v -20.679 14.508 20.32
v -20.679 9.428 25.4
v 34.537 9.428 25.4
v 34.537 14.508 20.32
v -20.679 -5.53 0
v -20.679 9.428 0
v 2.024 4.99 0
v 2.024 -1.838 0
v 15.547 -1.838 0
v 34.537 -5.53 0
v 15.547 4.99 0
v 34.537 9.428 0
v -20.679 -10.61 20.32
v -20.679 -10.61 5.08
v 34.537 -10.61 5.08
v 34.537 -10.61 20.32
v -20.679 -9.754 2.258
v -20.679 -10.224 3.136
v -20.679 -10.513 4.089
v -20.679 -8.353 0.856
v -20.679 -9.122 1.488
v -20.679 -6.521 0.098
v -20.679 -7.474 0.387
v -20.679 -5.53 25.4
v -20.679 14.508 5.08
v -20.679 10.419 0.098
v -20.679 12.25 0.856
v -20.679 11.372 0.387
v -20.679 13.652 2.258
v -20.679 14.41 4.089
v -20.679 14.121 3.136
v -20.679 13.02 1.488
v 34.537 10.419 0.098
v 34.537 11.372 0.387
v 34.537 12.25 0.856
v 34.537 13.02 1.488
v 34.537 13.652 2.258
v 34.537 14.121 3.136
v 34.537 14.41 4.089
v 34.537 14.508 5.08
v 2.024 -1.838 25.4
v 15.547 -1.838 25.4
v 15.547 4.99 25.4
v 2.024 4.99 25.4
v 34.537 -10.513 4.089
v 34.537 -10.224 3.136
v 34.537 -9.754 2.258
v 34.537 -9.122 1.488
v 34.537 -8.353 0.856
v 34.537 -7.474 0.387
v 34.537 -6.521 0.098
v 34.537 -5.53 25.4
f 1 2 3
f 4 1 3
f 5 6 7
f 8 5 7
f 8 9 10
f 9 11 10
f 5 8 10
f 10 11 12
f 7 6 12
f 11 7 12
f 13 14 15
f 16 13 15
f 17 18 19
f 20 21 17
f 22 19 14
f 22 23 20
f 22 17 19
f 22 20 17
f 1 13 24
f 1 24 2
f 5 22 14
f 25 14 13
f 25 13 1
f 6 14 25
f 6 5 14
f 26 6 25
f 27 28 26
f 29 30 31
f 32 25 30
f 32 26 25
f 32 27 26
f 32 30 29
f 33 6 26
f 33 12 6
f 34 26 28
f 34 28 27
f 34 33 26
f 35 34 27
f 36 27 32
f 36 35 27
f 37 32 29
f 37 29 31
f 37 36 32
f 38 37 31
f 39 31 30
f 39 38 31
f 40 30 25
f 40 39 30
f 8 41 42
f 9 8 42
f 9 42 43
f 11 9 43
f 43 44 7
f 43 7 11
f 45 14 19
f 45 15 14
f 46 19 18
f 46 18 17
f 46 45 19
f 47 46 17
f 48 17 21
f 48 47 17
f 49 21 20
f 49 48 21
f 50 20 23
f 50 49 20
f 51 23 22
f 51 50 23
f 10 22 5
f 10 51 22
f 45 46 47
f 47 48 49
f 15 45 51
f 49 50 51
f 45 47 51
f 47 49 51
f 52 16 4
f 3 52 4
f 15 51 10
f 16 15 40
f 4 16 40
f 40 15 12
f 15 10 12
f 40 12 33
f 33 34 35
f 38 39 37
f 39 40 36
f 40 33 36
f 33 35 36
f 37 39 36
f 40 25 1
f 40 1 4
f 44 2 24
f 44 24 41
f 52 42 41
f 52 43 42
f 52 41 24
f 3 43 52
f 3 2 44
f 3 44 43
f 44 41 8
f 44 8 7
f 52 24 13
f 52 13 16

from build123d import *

# Parameters (mm, degrees)
F0_W     = 55.216648
F0_H     = 25.118159
F1_DEPTH = 25.4
F2_W     = 13.522635
F2_H     = 6.827985
F3_DEPTH = 25.4
F4_SIZE  = 5.08
F5_R     = 5.08


with BuildPart() as f1:
    # F0 (on Top) → F1 (new body)
    with BuildSketch(Plane.XY):
        with Locations((6.929148, 1.948819)):
            Rectangle(F0_W, F0_H)
    extrude(amount=F1_DEPTH)

    # F2 (on face) → F3 (cut)
    with BuildSketch(Plane.XY.offset(25.4)):
        with Locations((8.785194, 1.576447)):
            Rectangle(F2_W, F2_H)
    extrude(amount=-F3_DEPTH, mode=Mode.SUBTRACT)

    # F4
    f4_edges = [f1.edges().sort_by_distance(p)[0] for p in [
        (6.929148, 14.507899, 25.4),
        (6.929148, -10.61026, 25.4),
    ]]
    chamfer(f4_edges, length=F4_SIZE)

    # F5
    f5_edges = [f1.edges().sort_by_distance(p)[0] for p in [
        (6.929148, -10.61026, 0),
        (6.929148, 14.507899, 0),
    ]]
    fillet(f5_edges, radius=F5_R)


solid = f1.part
